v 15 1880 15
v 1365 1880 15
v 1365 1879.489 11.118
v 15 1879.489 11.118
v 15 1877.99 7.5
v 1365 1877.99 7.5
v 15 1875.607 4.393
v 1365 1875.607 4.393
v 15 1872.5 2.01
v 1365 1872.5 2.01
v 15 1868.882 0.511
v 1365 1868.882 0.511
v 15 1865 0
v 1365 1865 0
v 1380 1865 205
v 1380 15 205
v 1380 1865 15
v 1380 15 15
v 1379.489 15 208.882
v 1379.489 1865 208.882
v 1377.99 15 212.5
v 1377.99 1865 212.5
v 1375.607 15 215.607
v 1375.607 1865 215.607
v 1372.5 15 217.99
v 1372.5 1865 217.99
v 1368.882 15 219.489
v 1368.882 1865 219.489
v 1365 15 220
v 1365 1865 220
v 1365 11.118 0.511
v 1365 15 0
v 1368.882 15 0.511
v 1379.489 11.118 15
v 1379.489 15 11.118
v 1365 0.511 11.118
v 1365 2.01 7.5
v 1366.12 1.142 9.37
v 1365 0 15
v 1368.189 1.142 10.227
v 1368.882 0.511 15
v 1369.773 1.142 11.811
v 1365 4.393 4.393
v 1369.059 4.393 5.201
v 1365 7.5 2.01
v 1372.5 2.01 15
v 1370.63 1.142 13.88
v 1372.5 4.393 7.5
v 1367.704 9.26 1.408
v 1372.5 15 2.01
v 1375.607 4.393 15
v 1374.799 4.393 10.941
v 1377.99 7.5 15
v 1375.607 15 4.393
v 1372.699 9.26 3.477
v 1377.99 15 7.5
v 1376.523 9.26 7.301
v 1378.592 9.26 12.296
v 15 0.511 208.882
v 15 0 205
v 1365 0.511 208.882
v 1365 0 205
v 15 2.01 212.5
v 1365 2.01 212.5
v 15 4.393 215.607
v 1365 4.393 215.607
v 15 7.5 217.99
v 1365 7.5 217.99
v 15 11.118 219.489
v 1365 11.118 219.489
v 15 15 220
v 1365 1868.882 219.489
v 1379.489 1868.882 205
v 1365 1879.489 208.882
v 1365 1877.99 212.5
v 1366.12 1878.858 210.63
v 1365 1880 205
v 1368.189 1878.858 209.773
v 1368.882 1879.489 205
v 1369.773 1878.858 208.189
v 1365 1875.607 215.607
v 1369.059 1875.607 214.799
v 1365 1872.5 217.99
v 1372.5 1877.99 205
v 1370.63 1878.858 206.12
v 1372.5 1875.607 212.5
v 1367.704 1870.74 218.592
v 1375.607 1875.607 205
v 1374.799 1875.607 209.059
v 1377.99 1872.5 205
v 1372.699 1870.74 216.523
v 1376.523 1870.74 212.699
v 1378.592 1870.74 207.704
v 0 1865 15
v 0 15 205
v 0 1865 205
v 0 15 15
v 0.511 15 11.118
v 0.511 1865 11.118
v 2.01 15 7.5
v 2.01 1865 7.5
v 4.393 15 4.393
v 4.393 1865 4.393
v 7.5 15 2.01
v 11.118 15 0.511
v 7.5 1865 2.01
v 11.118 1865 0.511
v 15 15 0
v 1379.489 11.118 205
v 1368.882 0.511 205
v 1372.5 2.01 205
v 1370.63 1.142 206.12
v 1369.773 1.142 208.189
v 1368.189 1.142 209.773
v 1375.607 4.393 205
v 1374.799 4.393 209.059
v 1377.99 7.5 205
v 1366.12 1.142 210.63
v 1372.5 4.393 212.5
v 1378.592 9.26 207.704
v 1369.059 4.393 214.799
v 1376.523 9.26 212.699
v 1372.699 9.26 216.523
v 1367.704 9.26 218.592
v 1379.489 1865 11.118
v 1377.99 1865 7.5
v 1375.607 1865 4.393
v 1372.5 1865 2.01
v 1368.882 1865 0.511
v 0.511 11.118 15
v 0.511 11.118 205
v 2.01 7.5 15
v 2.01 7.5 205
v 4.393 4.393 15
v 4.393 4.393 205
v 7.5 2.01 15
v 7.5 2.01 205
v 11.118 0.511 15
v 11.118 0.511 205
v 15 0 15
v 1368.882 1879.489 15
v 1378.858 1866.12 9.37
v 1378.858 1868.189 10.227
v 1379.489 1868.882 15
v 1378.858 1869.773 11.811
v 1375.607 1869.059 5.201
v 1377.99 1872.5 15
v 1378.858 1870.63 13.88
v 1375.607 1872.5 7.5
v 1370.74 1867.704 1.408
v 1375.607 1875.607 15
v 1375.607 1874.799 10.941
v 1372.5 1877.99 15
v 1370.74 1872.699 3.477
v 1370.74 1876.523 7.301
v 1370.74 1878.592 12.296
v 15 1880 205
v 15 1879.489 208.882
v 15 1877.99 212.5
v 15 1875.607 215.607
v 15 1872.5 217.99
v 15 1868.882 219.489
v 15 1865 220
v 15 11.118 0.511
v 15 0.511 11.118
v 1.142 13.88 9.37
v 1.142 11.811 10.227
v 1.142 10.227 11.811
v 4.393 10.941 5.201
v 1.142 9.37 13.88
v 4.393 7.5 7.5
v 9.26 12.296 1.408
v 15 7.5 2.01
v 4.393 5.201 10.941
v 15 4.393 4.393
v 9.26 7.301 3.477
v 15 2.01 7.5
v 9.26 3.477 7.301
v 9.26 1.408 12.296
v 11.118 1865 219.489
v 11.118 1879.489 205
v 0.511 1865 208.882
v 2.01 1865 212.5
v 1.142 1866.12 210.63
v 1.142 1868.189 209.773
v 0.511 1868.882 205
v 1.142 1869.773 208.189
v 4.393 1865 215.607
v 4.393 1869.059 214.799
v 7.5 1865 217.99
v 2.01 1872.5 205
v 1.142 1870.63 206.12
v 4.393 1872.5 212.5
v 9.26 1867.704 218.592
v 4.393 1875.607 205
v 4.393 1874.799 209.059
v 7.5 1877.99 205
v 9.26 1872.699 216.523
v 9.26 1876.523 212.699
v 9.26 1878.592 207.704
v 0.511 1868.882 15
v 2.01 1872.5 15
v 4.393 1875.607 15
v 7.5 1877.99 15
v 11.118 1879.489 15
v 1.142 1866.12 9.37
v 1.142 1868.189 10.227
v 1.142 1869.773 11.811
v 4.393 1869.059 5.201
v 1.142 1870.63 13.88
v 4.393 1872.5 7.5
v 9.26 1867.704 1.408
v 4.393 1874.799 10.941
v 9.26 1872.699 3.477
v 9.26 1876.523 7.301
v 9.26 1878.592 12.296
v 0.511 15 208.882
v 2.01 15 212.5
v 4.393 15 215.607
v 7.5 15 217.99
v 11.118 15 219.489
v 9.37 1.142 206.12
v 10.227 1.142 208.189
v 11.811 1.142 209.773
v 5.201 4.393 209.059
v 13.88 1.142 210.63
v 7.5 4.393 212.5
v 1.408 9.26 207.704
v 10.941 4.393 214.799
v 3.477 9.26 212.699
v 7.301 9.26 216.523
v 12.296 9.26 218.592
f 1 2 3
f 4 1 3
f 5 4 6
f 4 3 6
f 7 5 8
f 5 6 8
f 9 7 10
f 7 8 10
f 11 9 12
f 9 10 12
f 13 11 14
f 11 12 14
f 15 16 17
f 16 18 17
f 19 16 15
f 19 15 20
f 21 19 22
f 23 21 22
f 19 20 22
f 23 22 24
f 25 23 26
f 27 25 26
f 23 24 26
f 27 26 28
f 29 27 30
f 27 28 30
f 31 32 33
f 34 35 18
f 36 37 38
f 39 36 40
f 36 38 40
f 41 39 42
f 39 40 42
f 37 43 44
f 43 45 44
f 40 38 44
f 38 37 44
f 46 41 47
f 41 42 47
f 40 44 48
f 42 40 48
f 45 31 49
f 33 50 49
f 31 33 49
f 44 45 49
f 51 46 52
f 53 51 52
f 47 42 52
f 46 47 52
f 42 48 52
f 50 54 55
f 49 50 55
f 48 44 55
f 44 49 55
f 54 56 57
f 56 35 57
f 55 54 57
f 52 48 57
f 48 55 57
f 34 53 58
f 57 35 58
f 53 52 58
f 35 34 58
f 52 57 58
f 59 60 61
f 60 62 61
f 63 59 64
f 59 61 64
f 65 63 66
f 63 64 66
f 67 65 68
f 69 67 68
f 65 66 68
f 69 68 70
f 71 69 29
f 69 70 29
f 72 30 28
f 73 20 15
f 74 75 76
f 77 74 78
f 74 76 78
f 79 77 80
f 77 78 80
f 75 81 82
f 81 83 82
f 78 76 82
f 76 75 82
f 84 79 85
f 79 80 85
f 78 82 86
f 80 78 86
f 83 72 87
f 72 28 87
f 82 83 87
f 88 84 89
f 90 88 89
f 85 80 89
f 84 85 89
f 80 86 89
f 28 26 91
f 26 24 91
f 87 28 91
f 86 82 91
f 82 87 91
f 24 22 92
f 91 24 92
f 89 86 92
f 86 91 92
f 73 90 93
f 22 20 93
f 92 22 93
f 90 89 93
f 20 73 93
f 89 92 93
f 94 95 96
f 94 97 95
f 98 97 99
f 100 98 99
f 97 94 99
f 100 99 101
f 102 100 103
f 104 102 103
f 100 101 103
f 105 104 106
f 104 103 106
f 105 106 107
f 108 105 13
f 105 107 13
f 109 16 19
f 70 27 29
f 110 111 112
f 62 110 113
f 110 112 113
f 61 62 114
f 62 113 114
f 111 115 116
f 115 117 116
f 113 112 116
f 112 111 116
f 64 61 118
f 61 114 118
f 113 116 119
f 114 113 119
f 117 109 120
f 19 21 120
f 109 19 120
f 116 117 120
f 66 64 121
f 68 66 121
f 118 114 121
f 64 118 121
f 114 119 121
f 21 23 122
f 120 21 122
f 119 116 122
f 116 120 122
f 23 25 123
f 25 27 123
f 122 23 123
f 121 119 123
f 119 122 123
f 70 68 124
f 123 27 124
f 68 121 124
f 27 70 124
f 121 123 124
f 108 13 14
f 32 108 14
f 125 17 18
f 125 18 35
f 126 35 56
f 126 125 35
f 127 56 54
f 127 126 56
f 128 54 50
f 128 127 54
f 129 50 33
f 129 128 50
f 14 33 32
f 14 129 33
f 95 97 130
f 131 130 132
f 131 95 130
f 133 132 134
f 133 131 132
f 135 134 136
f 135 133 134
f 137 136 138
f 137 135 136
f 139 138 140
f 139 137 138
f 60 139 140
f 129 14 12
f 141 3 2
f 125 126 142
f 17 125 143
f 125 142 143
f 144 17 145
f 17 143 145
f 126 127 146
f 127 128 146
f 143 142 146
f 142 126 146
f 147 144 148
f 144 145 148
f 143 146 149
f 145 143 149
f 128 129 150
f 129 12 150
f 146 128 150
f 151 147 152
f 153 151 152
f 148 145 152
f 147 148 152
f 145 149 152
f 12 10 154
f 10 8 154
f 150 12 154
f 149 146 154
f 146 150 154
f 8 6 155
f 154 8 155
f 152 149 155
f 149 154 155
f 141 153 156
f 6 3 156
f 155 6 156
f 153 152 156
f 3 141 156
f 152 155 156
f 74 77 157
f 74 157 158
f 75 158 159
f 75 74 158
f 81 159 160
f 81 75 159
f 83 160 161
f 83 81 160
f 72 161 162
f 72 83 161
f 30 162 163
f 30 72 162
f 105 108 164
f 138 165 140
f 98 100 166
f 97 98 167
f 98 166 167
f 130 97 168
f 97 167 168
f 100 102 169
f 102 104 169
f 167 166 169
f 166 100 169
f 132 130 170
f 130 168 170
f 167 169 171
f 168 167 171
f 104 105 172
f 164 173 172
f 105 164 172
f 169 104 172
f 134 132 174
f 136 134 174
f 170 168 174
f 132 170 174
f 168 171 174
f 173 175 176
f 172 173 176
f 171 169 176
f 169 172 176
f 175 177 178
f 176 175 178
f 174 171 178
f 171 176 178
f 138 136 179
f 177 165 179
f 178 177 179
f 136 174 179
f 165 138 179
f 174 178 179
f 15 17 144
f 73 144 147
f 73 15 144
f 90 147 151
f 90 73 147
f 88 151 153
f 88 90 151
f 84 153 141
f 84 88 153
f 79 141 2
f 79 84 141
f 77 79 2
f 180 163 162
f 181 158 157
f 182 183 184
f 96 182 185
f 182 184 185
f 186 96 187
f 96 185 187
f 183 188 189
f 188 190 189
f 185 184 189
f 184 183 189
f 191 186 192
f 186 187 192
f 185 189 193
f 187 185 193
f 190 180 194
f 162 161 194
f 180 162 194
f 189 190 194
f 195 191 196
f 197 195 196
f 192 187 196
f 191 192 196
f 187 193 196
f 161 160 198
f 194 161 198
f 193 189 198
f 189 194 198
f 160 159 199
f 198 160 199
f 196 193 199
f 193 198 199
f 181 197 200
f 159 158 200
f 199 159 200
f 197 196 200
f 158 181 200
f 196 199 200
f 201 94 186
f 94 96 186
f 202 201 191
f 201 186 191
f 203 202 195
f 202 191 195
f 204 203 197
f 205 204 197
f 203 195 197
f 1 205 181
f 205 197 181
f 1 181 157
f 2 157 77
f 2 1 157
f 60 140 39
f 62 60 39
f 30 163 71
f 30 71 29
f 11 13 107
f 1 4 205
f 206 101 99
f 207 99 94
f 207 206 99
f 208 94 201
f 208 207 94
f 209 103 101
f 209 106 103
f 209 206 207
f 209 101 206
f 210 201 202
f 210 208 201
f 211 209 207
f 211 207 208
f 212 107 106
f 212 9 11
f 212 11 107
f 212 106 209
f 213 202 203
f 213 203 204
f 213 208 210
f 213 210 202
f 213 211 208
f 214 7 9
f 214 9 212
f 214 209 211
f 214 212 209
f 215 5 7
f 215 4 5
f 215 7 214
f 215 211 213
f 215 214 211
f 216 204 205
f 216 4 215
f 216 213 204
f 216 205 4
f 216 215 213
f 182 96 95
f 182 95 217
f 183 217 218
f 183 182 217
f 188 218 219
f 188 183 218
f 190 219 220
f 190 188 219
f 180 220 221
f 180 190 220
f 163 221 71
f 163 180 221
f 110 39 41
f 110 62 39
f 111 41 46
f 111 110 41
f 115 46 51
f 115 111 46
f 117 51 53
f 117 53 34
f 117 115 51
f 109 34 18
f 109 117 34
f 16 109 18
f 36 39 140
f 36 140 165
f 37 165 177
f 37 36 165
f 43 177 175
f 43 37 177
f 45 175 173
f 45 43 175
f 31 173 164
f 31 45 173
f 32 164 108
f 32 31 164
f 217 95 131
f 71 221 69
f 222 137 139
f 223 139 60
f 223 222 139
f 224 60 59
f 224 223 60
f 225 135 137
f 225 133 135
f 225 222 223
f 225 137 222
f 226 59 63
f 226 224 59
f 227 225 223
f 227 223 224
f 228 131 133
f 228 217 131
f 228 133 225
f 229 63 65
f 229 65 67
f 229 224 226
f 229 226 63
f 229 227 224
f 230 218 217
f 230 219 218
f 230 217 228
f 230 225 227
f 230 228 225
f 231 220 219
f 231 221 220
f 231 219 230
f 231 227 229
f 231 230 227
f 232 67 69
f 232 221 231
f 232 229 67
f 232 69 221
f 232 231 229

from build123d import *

# Parameters (mm, degrees)
ESBO_O1_W                = 1380
ESBO_O1_H                = 1880
RESSALTO_EXTRUS_O1_DEPTH = 220
FILETE1_R                = 15


with BuildPart() as part:
    # Esboço1 → Ressalto-extrusão1 (new body)
    with BuildSketch(Plane.XY):
        with Locations((690, 940)):
            Rectangle(ESBO_O1_W, ESBO_O1_H)
    extrude(amount=RESSALTO_EXTRUS_O1_DEPTH)

    # Filete1
    filete1_edges = [part.edges().sort_by_distance(p)[0] for p in [
        (1380, 940, 220),
        (690, 1880, 220),
        (0, 940, 220),
        (690, 1880, 0),
        (1380, 940, 0),
        (690, 0, 0),
        (0, 940, 0),
        (0, 1880, 110),
        (1380, 1880, 110),
        (1380, 0, 110),
        (0, 0, 110),
        (690, 0, 220),
    ]]
    fillet(filete1_edges, radius=FILETE1_R)


solid = part.part
